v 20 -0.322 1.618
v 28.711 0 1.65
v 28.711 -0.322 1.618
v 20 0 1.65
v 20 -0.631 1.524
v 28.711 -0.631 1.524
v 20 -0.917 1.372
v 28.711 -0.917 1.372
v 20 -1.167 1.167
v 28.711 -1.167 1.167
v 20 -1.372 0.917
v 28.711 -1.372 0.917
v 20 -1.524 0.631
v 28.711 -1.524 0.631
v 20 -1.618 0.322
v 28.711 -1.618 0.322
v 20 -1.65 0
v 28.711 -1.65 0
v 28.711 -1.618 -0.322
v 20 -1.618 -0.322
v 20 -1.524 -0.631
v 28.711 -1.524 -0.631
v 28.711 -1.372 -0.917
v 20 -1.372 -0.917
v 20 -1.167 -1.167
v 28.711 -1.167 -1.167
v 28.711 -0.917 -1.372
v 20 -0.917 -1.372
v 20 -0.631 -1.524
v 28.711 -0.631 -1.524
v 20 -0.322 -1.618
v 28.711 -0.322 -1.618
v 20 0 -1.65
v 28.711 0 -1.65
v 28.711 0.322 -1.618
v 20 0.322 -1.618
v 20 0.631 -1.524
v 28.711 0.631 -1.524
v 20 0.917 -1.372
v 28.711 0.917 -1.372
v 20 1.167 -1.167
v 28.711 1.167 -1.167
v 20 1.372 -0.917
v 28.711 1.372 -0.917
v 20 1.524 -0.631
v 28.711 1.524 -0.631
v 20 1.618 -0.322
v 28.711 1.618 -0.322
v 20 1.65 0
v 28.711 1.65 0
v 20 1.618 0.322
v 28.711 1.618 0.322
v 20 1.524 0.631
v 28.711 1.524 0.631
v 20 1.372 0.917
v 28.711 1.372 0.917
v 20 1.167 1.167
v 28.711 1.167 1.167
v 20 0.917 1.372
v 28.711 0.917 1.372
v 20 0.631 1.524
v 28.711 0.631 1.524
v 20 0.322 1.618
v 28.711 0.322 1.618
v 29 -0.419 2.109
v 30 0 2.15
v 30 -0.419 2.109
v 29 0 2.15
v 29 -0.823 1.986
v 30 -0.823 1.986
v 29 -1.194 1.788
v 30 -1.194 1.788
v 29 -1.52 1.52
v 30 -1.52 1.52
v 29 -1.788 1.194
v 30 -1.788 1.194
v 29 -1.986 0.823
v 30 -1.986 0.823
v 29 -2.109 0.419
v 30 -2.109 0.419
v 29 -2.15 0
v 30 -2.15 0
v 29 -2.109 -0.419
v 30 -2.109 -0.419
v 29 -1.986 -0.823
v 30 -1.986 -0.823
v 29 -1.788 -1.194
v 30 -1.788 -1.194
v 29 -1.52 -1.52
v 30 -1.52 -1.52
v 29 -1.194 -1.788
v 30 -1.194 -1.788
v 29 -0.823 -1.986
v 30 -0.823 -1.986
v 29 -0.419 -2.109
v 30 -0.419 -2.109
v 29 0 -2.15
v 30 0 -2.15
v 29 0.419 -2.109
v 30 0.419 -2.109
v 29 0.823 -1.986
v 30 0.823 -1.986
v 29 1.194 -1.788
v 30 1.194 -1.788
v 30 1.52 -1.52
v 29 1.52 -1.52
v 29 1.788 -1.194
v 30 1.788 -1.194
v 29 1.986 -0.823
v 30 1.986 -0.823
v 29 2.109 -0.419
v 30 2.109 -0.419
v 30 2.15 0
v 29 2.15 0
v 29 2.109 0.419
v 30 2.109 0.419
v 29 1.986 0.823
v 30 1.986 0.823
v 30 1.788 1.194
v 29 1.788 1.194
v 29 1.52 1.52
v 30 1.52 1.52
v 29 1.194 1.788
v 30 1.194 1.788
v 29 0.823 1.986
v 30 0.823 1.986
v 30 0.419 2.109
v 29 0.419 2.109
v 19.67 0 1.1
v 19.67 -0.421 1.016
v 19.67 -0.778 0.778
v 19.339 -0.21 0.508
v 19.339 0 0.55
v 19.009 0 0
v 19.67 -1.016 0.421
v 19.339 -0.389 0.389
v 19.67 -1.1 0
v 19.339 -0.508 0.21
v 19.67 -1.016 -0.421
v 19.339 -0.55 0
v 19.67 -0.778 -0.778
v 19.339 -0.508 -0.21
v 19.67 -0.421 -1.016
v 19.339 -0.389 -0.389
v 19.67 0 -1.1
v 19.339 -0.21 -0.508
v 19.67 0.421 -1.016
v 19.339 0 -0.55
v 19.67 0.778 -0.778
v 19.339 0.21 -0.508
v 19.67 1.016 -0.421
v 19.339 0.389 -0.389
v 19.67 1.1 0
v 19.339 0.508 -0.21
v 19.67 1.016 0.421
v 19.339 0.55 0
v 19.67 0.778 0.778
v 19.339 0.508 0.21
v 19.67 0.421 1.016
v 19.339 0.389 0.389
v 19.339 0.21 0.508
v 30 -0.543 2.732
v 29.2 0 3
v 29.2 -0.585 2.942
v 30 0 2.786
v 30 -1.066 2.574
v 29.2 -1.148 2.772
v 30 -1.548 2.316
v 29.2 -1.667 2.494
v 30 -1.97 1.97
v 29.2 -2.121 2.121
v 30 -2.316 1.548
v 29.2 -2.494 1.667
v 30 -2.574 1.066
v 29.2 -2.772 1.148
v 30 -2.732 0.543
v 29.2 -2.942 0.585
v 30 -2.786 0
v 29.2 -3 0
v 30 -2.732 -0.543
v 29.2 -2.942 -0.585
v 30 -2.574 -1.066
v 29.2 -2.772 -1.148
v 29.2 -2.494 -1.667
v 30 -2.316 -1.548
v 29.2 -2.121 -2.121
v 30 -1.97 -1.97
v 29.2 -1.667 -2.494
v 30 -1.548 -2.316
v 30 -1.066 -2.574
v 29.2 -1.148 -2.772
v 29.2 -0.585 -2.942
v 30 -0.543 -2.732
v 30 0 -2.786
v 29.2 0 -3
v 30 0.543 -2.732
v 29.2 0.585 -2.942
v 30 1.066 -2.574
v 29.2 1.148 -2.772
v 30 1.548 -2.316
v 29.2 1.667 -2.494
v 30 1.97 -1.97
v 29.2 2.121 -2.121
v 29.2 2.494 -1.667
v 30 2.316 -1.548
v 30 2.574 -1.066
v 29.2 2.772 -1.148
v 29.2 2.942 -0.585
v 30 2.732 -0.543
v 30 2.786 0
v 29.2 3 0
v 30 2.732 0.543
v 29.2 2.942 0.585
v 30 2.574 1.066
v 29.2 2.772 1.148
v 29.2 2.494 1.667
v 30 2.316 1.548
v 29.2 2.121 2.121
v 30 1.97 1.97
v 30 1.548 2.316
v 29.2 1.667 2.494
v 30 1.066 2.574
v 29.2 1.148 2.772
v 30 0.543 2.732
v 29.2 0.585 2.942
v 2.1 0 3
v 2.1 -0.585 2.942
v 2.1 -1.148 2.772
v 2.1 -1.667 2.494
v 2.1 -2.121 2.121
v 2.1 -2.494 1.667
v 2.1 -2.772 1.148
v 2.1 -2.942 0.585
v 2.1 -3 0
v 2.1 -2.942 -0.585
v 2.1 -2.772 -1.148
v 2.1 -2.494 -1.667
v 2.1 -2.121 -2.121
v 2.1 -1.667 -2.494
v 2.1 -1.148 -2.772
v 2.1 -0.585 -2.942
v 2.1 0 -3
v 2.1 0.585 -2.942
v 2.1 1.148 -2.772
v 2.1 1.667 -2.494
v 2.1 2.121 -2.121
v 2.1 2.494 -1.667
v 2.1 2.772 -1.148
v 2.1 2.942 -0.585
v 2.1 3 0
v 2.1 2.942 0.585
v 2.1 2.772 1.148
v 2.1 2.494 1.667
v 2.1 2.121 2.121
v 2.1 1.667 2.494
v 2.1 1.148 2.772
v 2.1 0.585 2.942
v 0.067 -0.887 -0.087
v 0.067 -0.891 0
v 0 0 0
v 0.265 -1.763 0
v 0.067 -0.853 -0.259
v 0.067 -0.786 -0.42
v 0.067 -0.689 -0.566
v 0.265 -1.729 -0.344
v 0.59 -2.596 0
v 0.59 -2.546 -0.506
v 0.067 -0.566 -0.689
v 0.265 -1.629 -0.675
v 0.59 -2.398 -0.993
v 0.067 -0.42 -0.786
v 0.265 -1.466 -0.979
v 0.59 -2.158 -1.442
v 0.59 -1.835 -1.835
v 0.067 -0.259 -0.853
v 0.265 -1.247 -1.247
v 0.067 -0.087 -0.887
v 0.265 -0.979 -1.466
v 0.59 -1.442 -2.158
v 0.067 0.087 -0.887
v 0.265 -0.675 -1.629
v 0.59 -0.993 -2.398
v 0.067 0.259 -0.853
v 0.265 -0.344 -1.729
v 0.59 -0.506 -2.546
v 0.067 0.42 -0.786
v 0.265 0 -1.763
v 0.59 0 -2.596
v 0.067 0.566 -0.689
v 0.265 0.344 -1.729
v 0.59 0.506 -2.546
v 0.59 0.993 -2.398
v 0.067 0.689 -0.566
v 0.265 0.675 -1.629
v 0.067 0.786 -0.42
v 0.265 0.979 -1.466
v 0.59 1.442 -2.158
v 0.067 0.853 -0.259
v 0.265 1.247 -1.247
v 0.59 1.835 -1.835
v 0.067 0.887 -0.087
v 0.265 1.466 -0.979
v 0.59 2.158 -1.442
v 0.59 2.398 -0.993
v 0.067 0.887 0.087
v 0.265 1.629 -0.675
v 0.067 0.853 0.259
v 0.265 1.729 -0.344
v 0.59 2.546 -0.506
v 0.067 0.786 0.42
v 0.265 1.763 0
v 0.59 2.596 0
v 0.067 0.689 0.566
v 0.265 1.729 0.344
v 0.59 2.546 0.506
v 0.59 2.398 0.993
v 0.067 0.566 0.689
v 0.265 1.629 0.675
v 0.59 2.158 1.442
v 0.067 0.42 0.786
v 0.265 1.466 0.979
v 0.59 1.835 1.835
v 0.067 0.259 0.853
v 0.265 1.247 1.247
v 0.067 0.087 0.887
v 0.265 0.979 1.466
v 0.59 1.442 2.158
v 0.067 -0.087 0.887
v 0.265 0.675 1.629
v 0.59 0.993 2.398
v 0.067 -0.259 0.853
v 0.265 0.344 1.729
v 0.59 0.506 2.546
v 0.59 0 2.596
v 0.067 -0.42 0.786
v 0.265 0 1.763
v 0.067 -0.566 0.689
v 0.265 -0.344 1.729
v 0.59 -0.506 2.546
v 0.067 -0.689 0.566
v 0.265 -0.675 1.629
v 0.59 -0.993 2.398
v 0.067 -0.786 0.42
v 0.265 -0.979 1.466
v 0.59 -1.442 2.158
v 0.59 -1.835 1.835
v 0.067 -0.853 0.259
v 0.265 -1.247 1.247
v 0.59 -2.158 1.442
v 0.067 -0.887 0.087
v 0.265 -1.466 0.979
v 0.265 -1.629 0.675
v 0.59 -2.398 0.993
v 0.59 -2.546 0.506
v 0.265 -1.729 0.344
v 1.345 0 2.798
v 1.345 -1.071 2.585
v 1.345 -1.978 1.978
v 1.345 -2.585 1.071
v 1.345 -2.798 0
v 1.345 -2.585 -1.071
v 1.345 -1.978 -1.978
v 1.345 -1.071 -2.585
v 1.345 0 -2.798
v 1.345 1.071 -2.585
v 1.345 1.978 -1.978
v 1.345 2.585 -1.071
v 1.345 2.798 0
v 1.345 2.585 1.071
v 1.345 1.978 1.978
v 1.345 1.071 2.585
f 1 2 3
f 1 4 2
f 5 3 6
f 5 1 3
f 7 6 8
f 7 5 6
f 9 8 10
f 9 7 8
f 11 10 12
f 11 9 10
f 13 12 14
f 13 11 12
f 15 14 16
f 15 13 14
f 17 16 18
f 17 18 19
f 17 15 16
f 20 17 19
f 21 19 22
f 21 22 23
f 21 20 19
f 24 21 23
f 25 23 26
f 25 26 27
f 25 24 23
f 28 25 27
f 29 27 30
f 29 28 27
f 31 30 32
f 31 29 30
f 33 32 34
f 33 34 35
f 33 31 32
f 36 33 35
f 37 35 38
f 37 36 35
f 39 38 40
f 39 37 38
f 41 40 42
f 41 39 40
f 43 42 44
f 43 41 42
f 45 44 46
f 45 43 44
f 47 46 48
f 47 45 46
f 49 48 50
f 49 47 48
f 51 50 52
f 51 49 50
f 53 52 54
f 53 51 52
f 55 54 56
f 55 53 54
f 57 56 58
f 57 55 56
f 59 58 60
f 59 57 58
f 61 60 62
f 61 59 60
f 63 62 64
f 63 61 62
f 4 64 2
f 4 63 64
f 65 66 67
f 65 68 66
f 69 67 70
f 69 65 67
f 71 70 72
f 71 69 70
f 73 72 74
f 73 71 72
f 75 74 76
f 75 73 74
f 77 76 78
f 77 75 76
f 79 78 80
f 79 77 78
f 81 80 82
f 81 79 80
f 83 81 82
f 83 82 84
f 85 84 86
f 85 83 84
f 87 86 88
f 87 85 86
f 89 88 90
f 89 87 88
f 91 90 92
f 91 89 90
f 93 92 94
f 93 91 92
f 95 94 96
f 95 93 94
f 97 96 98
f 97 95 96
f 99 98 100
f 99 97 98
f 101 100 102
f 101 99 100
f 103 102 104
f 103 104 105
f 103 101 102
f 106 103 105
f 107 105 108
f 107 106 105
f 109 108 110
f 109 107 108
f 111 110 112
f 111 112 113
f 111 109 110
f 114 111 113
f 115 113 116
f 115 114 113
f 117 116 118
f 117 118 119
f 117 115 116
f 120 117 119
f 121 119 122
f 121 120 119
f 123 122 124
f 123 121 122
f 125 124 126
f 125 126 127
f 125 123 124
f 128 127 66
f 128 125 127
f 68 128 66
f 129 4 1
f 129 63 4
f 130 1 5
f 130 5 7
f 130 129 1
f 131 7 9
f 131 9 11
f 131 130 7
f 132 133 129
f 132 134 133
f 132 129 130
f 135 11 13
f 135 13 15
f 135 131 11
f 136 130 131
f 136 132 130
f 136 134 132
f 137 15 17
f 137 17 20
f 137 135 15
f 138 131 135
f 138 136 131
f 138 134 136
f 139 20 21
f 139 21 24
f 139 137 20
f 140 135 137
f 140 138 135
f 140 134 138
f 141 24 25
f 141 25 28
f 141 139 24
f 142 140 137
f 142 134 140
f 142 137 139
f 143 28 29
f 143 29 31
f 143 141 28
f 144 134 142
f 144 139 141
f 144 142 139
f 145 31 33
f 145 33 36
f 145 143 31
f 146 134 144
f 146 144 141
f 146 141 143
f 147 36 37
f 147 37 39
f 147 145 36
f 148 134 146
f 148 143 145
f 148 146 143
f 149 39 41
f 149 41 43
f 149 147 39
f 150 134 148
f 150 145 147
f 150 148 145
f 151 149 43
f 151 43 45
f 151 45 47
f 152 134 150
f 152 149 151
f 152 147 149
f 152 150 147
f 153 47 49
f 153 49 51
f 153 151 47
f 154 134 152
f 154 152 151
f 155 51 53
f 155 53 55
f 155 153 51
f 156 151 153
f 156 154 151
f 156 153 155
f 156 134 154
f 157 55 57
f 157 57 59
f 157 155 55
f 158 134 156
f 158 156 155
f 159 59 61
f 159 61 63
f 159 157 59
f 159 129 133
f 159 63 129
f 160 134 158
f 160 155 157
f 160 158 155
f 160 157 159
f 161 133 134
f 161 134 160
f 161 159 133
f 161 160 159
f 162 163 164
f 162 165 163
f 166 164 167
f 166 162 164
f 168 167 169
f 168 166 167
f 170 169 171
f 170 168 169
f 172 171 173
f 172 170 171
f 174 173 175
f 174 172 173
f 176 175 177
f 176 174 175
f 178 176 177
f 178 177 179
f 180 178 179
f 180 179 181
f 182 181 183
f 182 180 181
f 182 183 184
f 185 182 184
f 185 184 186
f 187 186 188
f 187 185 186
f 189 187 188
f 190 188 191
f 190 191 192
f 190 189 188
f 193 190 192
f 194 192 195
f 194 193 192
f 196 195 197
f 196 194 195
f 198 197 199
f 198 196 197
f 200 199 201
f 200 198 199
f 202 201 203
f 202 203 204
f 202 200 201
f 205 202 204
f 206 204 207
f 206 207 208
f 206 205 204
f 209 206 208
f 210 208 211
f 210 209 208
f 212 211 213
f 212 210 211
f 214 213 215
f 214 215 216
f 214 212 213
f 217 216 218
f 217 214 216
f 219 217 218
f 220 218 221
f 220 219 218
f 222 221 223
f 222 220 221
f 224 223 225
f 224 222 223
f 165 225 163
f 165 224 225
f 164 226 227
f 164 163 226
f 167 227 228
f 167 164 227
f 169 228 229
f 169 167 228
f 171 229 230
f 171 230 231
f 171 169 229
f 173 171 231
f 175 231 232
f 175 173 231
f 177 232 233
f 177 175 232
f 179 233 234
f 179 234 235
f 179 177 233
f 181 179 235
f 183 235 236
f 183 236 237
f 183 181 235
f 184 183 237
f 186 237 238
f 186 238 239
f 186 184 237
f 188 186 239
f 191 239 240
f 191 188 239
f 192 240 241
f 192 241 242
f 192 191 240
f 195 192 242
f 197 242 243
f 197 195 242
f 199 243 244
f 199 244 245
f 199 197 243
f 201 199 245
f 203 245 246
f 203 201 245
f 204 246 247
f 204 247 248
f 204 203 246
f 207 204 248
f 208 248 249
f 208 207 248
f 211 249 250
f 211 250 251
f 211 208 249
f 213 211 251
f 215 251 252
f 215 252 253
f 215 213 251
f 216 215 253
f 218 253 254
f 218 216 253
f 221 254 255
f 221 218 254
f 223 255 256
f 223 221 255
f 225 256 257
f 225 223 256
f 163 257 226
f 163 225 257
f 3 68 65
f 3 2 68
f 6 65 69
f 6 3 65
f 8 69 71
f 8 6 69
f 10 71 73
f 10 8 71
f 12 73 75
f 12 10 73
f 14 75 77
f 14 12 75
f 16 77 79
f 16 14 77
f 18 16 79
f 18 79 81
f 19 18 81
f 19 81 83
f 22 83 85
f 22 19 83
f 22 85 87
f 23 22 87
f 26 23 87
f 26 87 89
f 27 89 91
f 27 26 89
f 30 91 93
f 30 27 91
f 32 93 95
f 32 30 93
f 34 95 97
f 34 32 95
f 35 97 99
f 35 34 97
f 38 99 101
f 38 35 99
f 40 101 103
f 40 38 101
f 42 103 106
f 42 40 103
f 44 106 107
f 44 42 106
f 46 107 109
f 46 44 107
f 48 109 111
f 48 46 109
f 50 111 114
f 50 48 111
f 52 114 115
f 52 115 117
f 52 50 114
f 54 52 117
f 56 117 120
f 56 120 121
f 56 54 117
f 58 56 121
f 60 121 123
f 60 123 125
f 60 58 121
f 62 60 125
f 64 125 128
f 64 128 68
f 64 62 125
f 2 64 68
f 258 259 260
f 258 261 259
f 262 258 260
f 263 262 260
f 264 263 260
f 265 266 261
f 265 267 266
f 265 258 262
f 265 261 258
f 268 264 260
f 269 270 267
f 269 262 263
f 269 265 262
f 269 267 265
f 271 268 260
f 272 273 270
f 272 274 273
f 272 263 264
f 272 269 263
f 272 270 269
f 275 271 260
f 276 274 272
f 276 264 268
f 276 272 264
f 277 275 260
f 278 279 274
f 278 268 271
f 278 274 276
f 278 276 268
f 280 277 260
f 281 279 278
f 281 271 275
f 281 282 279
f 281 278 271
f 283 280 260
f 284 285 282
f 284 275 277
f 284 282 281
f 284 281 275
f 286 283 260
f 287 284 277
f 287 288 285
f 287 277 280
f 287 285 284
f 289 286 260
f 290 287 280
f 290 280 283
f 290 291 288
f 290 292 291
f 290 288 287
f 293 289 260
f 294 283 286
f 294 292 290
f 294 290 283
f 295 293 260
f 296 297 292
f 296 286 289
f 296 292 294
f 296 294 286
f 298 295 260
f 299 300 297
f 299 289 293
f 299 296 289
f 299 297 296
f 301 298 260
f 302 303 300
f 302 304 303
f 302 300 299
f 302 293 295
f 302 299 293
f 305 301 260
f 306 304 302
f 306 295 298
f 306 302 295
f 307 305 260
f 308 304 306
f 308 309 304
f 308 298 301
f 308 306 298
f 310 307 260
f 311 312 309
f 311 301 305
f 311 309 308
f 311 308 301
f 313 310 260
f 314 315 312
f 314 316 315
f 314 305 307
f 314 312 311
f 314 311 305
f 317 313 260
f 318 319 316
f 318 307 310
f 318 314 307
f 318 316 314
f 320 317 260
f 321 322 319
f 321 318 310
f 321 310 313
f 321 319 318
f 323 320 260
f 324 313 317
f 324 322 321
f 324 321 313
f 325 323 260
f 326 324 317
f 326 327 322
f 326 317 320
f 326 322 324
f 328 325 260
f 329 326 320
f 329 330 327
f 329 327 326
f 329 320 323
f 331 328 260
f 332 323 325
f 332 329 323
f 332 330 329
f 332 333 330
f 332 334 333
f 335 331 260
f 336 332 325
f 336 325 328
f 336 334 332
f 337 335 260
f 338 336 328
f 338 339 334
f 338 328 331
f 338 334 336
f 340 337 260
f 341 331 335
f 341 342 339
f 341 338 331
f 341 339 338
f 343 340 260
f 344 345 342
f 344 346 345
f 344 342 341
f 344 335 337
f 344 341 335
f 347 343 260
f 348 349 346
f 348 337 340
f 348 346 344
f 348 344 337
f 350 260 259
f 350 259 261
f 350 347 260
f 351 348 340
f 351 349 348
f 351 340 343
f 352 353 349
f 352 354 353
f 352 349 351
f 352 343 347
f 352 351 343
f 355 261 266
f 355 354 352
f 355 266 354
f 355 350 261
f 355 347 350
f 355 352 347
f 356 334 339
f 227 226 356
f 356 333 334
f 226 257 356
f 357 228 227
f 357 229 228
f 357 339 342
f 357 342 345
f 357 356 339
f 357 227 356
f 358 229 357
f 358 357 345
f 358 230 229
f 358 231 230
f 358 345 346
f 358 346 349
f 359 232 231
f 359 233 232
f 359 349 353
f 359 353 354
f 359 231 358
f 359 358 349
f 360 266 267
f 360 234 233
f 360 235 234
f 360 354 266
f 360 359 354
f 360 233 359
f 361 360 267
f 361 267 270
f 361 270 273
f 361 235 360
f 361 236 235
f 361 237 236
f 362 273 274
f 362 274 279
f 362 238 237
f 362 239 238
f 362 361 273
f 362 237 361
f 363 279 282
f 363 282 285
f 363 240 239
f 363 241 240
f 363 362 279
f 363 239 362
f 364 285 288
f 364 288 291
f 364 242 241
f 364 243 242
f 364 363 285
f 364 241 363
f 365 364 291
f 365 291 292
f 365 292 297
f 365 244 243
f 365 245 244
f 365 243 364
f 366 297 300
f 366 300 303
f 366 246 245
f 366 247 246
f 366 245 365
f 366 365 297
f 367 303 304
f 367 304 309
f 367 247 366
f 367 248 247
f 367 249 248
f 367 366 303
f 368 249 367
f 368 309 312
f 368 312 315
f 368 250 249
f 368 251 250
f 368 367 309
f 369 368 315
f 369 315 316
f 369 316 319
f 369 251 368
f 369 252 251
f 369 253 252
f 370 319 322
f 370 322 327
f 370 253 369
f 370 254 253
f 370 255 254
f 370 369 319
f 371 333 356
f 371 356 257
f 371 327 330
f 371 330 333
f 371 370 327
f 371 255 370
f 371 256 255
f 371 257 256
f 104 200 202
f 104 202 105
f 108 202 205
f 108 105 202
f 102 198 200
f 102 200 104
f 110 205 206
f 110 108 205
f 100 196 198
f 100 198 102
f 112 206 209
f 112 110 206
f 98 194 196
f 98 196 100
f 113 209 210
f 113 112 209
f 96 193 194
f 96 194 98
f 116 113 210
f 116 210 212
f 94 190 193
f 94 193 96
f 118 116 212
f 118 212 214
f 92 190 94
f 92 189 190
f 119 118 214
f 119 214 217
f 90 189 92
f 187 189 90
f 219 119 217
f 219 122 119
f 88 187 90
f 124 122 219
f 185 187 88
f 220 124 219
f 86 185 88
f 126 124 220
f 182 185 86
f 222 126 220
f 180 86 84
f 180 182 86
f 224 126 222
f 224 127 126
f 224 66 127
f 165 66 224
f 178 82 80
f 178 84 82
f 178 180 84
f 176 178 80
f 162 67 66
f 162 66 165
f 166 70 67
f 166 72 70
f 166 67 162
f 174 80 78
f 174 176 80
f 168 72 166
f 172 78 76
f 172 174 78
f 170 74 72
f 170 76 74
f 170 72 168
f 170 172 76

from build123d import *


with BuildPart() as part:
    # Sketch1 → Base-Revolve (revolve)
    with BuildSketch(Plane.XY, mode=Mode.PRIVATE) as base_revolve_sk:
        Polygon((0, 0), (0, 2.437306696), (2.1, 3), (29.2, 3), (30, 2.785640646), (30, 2.15), (29, 2.15), (28.711324865, 1.65), (20, 1.65), (19.008579979, 0), align=None)
    revolve(base_revolve_sk.sketch.rotate(Axis((-10, 0, 0), (1, 0, 0)), 90), axis=Axis((-10, 0, 0), (1, 0, 0)))

    # Sketch2 → TypeA (revolve, cut)
    with BuildSketch(Plane.XY, mode=Mode.PRIVATE) as typea_sk:
        with BuildLine():
            Line((0.590443768, 2.595515627), (0.590443768, 8))
            Line((0.590443768, 8), (-5, 8))
            Line((-5, 8), (-5, 0))
            Line((-5, 0), (0, 0))
            ThreePointArc((0, 0), (0.149472785, 1.33091371), (0.590443768, 2.595515627))
        make_face()
    revolve(typea_sk.sketch.rotate(Axis((0, 0, 0), (1, 0, 0)), 180), axis=Axis((0, 0, 0), (1, 0, 0)), mode=Mode.SUBTRACT)


solid = part.part
